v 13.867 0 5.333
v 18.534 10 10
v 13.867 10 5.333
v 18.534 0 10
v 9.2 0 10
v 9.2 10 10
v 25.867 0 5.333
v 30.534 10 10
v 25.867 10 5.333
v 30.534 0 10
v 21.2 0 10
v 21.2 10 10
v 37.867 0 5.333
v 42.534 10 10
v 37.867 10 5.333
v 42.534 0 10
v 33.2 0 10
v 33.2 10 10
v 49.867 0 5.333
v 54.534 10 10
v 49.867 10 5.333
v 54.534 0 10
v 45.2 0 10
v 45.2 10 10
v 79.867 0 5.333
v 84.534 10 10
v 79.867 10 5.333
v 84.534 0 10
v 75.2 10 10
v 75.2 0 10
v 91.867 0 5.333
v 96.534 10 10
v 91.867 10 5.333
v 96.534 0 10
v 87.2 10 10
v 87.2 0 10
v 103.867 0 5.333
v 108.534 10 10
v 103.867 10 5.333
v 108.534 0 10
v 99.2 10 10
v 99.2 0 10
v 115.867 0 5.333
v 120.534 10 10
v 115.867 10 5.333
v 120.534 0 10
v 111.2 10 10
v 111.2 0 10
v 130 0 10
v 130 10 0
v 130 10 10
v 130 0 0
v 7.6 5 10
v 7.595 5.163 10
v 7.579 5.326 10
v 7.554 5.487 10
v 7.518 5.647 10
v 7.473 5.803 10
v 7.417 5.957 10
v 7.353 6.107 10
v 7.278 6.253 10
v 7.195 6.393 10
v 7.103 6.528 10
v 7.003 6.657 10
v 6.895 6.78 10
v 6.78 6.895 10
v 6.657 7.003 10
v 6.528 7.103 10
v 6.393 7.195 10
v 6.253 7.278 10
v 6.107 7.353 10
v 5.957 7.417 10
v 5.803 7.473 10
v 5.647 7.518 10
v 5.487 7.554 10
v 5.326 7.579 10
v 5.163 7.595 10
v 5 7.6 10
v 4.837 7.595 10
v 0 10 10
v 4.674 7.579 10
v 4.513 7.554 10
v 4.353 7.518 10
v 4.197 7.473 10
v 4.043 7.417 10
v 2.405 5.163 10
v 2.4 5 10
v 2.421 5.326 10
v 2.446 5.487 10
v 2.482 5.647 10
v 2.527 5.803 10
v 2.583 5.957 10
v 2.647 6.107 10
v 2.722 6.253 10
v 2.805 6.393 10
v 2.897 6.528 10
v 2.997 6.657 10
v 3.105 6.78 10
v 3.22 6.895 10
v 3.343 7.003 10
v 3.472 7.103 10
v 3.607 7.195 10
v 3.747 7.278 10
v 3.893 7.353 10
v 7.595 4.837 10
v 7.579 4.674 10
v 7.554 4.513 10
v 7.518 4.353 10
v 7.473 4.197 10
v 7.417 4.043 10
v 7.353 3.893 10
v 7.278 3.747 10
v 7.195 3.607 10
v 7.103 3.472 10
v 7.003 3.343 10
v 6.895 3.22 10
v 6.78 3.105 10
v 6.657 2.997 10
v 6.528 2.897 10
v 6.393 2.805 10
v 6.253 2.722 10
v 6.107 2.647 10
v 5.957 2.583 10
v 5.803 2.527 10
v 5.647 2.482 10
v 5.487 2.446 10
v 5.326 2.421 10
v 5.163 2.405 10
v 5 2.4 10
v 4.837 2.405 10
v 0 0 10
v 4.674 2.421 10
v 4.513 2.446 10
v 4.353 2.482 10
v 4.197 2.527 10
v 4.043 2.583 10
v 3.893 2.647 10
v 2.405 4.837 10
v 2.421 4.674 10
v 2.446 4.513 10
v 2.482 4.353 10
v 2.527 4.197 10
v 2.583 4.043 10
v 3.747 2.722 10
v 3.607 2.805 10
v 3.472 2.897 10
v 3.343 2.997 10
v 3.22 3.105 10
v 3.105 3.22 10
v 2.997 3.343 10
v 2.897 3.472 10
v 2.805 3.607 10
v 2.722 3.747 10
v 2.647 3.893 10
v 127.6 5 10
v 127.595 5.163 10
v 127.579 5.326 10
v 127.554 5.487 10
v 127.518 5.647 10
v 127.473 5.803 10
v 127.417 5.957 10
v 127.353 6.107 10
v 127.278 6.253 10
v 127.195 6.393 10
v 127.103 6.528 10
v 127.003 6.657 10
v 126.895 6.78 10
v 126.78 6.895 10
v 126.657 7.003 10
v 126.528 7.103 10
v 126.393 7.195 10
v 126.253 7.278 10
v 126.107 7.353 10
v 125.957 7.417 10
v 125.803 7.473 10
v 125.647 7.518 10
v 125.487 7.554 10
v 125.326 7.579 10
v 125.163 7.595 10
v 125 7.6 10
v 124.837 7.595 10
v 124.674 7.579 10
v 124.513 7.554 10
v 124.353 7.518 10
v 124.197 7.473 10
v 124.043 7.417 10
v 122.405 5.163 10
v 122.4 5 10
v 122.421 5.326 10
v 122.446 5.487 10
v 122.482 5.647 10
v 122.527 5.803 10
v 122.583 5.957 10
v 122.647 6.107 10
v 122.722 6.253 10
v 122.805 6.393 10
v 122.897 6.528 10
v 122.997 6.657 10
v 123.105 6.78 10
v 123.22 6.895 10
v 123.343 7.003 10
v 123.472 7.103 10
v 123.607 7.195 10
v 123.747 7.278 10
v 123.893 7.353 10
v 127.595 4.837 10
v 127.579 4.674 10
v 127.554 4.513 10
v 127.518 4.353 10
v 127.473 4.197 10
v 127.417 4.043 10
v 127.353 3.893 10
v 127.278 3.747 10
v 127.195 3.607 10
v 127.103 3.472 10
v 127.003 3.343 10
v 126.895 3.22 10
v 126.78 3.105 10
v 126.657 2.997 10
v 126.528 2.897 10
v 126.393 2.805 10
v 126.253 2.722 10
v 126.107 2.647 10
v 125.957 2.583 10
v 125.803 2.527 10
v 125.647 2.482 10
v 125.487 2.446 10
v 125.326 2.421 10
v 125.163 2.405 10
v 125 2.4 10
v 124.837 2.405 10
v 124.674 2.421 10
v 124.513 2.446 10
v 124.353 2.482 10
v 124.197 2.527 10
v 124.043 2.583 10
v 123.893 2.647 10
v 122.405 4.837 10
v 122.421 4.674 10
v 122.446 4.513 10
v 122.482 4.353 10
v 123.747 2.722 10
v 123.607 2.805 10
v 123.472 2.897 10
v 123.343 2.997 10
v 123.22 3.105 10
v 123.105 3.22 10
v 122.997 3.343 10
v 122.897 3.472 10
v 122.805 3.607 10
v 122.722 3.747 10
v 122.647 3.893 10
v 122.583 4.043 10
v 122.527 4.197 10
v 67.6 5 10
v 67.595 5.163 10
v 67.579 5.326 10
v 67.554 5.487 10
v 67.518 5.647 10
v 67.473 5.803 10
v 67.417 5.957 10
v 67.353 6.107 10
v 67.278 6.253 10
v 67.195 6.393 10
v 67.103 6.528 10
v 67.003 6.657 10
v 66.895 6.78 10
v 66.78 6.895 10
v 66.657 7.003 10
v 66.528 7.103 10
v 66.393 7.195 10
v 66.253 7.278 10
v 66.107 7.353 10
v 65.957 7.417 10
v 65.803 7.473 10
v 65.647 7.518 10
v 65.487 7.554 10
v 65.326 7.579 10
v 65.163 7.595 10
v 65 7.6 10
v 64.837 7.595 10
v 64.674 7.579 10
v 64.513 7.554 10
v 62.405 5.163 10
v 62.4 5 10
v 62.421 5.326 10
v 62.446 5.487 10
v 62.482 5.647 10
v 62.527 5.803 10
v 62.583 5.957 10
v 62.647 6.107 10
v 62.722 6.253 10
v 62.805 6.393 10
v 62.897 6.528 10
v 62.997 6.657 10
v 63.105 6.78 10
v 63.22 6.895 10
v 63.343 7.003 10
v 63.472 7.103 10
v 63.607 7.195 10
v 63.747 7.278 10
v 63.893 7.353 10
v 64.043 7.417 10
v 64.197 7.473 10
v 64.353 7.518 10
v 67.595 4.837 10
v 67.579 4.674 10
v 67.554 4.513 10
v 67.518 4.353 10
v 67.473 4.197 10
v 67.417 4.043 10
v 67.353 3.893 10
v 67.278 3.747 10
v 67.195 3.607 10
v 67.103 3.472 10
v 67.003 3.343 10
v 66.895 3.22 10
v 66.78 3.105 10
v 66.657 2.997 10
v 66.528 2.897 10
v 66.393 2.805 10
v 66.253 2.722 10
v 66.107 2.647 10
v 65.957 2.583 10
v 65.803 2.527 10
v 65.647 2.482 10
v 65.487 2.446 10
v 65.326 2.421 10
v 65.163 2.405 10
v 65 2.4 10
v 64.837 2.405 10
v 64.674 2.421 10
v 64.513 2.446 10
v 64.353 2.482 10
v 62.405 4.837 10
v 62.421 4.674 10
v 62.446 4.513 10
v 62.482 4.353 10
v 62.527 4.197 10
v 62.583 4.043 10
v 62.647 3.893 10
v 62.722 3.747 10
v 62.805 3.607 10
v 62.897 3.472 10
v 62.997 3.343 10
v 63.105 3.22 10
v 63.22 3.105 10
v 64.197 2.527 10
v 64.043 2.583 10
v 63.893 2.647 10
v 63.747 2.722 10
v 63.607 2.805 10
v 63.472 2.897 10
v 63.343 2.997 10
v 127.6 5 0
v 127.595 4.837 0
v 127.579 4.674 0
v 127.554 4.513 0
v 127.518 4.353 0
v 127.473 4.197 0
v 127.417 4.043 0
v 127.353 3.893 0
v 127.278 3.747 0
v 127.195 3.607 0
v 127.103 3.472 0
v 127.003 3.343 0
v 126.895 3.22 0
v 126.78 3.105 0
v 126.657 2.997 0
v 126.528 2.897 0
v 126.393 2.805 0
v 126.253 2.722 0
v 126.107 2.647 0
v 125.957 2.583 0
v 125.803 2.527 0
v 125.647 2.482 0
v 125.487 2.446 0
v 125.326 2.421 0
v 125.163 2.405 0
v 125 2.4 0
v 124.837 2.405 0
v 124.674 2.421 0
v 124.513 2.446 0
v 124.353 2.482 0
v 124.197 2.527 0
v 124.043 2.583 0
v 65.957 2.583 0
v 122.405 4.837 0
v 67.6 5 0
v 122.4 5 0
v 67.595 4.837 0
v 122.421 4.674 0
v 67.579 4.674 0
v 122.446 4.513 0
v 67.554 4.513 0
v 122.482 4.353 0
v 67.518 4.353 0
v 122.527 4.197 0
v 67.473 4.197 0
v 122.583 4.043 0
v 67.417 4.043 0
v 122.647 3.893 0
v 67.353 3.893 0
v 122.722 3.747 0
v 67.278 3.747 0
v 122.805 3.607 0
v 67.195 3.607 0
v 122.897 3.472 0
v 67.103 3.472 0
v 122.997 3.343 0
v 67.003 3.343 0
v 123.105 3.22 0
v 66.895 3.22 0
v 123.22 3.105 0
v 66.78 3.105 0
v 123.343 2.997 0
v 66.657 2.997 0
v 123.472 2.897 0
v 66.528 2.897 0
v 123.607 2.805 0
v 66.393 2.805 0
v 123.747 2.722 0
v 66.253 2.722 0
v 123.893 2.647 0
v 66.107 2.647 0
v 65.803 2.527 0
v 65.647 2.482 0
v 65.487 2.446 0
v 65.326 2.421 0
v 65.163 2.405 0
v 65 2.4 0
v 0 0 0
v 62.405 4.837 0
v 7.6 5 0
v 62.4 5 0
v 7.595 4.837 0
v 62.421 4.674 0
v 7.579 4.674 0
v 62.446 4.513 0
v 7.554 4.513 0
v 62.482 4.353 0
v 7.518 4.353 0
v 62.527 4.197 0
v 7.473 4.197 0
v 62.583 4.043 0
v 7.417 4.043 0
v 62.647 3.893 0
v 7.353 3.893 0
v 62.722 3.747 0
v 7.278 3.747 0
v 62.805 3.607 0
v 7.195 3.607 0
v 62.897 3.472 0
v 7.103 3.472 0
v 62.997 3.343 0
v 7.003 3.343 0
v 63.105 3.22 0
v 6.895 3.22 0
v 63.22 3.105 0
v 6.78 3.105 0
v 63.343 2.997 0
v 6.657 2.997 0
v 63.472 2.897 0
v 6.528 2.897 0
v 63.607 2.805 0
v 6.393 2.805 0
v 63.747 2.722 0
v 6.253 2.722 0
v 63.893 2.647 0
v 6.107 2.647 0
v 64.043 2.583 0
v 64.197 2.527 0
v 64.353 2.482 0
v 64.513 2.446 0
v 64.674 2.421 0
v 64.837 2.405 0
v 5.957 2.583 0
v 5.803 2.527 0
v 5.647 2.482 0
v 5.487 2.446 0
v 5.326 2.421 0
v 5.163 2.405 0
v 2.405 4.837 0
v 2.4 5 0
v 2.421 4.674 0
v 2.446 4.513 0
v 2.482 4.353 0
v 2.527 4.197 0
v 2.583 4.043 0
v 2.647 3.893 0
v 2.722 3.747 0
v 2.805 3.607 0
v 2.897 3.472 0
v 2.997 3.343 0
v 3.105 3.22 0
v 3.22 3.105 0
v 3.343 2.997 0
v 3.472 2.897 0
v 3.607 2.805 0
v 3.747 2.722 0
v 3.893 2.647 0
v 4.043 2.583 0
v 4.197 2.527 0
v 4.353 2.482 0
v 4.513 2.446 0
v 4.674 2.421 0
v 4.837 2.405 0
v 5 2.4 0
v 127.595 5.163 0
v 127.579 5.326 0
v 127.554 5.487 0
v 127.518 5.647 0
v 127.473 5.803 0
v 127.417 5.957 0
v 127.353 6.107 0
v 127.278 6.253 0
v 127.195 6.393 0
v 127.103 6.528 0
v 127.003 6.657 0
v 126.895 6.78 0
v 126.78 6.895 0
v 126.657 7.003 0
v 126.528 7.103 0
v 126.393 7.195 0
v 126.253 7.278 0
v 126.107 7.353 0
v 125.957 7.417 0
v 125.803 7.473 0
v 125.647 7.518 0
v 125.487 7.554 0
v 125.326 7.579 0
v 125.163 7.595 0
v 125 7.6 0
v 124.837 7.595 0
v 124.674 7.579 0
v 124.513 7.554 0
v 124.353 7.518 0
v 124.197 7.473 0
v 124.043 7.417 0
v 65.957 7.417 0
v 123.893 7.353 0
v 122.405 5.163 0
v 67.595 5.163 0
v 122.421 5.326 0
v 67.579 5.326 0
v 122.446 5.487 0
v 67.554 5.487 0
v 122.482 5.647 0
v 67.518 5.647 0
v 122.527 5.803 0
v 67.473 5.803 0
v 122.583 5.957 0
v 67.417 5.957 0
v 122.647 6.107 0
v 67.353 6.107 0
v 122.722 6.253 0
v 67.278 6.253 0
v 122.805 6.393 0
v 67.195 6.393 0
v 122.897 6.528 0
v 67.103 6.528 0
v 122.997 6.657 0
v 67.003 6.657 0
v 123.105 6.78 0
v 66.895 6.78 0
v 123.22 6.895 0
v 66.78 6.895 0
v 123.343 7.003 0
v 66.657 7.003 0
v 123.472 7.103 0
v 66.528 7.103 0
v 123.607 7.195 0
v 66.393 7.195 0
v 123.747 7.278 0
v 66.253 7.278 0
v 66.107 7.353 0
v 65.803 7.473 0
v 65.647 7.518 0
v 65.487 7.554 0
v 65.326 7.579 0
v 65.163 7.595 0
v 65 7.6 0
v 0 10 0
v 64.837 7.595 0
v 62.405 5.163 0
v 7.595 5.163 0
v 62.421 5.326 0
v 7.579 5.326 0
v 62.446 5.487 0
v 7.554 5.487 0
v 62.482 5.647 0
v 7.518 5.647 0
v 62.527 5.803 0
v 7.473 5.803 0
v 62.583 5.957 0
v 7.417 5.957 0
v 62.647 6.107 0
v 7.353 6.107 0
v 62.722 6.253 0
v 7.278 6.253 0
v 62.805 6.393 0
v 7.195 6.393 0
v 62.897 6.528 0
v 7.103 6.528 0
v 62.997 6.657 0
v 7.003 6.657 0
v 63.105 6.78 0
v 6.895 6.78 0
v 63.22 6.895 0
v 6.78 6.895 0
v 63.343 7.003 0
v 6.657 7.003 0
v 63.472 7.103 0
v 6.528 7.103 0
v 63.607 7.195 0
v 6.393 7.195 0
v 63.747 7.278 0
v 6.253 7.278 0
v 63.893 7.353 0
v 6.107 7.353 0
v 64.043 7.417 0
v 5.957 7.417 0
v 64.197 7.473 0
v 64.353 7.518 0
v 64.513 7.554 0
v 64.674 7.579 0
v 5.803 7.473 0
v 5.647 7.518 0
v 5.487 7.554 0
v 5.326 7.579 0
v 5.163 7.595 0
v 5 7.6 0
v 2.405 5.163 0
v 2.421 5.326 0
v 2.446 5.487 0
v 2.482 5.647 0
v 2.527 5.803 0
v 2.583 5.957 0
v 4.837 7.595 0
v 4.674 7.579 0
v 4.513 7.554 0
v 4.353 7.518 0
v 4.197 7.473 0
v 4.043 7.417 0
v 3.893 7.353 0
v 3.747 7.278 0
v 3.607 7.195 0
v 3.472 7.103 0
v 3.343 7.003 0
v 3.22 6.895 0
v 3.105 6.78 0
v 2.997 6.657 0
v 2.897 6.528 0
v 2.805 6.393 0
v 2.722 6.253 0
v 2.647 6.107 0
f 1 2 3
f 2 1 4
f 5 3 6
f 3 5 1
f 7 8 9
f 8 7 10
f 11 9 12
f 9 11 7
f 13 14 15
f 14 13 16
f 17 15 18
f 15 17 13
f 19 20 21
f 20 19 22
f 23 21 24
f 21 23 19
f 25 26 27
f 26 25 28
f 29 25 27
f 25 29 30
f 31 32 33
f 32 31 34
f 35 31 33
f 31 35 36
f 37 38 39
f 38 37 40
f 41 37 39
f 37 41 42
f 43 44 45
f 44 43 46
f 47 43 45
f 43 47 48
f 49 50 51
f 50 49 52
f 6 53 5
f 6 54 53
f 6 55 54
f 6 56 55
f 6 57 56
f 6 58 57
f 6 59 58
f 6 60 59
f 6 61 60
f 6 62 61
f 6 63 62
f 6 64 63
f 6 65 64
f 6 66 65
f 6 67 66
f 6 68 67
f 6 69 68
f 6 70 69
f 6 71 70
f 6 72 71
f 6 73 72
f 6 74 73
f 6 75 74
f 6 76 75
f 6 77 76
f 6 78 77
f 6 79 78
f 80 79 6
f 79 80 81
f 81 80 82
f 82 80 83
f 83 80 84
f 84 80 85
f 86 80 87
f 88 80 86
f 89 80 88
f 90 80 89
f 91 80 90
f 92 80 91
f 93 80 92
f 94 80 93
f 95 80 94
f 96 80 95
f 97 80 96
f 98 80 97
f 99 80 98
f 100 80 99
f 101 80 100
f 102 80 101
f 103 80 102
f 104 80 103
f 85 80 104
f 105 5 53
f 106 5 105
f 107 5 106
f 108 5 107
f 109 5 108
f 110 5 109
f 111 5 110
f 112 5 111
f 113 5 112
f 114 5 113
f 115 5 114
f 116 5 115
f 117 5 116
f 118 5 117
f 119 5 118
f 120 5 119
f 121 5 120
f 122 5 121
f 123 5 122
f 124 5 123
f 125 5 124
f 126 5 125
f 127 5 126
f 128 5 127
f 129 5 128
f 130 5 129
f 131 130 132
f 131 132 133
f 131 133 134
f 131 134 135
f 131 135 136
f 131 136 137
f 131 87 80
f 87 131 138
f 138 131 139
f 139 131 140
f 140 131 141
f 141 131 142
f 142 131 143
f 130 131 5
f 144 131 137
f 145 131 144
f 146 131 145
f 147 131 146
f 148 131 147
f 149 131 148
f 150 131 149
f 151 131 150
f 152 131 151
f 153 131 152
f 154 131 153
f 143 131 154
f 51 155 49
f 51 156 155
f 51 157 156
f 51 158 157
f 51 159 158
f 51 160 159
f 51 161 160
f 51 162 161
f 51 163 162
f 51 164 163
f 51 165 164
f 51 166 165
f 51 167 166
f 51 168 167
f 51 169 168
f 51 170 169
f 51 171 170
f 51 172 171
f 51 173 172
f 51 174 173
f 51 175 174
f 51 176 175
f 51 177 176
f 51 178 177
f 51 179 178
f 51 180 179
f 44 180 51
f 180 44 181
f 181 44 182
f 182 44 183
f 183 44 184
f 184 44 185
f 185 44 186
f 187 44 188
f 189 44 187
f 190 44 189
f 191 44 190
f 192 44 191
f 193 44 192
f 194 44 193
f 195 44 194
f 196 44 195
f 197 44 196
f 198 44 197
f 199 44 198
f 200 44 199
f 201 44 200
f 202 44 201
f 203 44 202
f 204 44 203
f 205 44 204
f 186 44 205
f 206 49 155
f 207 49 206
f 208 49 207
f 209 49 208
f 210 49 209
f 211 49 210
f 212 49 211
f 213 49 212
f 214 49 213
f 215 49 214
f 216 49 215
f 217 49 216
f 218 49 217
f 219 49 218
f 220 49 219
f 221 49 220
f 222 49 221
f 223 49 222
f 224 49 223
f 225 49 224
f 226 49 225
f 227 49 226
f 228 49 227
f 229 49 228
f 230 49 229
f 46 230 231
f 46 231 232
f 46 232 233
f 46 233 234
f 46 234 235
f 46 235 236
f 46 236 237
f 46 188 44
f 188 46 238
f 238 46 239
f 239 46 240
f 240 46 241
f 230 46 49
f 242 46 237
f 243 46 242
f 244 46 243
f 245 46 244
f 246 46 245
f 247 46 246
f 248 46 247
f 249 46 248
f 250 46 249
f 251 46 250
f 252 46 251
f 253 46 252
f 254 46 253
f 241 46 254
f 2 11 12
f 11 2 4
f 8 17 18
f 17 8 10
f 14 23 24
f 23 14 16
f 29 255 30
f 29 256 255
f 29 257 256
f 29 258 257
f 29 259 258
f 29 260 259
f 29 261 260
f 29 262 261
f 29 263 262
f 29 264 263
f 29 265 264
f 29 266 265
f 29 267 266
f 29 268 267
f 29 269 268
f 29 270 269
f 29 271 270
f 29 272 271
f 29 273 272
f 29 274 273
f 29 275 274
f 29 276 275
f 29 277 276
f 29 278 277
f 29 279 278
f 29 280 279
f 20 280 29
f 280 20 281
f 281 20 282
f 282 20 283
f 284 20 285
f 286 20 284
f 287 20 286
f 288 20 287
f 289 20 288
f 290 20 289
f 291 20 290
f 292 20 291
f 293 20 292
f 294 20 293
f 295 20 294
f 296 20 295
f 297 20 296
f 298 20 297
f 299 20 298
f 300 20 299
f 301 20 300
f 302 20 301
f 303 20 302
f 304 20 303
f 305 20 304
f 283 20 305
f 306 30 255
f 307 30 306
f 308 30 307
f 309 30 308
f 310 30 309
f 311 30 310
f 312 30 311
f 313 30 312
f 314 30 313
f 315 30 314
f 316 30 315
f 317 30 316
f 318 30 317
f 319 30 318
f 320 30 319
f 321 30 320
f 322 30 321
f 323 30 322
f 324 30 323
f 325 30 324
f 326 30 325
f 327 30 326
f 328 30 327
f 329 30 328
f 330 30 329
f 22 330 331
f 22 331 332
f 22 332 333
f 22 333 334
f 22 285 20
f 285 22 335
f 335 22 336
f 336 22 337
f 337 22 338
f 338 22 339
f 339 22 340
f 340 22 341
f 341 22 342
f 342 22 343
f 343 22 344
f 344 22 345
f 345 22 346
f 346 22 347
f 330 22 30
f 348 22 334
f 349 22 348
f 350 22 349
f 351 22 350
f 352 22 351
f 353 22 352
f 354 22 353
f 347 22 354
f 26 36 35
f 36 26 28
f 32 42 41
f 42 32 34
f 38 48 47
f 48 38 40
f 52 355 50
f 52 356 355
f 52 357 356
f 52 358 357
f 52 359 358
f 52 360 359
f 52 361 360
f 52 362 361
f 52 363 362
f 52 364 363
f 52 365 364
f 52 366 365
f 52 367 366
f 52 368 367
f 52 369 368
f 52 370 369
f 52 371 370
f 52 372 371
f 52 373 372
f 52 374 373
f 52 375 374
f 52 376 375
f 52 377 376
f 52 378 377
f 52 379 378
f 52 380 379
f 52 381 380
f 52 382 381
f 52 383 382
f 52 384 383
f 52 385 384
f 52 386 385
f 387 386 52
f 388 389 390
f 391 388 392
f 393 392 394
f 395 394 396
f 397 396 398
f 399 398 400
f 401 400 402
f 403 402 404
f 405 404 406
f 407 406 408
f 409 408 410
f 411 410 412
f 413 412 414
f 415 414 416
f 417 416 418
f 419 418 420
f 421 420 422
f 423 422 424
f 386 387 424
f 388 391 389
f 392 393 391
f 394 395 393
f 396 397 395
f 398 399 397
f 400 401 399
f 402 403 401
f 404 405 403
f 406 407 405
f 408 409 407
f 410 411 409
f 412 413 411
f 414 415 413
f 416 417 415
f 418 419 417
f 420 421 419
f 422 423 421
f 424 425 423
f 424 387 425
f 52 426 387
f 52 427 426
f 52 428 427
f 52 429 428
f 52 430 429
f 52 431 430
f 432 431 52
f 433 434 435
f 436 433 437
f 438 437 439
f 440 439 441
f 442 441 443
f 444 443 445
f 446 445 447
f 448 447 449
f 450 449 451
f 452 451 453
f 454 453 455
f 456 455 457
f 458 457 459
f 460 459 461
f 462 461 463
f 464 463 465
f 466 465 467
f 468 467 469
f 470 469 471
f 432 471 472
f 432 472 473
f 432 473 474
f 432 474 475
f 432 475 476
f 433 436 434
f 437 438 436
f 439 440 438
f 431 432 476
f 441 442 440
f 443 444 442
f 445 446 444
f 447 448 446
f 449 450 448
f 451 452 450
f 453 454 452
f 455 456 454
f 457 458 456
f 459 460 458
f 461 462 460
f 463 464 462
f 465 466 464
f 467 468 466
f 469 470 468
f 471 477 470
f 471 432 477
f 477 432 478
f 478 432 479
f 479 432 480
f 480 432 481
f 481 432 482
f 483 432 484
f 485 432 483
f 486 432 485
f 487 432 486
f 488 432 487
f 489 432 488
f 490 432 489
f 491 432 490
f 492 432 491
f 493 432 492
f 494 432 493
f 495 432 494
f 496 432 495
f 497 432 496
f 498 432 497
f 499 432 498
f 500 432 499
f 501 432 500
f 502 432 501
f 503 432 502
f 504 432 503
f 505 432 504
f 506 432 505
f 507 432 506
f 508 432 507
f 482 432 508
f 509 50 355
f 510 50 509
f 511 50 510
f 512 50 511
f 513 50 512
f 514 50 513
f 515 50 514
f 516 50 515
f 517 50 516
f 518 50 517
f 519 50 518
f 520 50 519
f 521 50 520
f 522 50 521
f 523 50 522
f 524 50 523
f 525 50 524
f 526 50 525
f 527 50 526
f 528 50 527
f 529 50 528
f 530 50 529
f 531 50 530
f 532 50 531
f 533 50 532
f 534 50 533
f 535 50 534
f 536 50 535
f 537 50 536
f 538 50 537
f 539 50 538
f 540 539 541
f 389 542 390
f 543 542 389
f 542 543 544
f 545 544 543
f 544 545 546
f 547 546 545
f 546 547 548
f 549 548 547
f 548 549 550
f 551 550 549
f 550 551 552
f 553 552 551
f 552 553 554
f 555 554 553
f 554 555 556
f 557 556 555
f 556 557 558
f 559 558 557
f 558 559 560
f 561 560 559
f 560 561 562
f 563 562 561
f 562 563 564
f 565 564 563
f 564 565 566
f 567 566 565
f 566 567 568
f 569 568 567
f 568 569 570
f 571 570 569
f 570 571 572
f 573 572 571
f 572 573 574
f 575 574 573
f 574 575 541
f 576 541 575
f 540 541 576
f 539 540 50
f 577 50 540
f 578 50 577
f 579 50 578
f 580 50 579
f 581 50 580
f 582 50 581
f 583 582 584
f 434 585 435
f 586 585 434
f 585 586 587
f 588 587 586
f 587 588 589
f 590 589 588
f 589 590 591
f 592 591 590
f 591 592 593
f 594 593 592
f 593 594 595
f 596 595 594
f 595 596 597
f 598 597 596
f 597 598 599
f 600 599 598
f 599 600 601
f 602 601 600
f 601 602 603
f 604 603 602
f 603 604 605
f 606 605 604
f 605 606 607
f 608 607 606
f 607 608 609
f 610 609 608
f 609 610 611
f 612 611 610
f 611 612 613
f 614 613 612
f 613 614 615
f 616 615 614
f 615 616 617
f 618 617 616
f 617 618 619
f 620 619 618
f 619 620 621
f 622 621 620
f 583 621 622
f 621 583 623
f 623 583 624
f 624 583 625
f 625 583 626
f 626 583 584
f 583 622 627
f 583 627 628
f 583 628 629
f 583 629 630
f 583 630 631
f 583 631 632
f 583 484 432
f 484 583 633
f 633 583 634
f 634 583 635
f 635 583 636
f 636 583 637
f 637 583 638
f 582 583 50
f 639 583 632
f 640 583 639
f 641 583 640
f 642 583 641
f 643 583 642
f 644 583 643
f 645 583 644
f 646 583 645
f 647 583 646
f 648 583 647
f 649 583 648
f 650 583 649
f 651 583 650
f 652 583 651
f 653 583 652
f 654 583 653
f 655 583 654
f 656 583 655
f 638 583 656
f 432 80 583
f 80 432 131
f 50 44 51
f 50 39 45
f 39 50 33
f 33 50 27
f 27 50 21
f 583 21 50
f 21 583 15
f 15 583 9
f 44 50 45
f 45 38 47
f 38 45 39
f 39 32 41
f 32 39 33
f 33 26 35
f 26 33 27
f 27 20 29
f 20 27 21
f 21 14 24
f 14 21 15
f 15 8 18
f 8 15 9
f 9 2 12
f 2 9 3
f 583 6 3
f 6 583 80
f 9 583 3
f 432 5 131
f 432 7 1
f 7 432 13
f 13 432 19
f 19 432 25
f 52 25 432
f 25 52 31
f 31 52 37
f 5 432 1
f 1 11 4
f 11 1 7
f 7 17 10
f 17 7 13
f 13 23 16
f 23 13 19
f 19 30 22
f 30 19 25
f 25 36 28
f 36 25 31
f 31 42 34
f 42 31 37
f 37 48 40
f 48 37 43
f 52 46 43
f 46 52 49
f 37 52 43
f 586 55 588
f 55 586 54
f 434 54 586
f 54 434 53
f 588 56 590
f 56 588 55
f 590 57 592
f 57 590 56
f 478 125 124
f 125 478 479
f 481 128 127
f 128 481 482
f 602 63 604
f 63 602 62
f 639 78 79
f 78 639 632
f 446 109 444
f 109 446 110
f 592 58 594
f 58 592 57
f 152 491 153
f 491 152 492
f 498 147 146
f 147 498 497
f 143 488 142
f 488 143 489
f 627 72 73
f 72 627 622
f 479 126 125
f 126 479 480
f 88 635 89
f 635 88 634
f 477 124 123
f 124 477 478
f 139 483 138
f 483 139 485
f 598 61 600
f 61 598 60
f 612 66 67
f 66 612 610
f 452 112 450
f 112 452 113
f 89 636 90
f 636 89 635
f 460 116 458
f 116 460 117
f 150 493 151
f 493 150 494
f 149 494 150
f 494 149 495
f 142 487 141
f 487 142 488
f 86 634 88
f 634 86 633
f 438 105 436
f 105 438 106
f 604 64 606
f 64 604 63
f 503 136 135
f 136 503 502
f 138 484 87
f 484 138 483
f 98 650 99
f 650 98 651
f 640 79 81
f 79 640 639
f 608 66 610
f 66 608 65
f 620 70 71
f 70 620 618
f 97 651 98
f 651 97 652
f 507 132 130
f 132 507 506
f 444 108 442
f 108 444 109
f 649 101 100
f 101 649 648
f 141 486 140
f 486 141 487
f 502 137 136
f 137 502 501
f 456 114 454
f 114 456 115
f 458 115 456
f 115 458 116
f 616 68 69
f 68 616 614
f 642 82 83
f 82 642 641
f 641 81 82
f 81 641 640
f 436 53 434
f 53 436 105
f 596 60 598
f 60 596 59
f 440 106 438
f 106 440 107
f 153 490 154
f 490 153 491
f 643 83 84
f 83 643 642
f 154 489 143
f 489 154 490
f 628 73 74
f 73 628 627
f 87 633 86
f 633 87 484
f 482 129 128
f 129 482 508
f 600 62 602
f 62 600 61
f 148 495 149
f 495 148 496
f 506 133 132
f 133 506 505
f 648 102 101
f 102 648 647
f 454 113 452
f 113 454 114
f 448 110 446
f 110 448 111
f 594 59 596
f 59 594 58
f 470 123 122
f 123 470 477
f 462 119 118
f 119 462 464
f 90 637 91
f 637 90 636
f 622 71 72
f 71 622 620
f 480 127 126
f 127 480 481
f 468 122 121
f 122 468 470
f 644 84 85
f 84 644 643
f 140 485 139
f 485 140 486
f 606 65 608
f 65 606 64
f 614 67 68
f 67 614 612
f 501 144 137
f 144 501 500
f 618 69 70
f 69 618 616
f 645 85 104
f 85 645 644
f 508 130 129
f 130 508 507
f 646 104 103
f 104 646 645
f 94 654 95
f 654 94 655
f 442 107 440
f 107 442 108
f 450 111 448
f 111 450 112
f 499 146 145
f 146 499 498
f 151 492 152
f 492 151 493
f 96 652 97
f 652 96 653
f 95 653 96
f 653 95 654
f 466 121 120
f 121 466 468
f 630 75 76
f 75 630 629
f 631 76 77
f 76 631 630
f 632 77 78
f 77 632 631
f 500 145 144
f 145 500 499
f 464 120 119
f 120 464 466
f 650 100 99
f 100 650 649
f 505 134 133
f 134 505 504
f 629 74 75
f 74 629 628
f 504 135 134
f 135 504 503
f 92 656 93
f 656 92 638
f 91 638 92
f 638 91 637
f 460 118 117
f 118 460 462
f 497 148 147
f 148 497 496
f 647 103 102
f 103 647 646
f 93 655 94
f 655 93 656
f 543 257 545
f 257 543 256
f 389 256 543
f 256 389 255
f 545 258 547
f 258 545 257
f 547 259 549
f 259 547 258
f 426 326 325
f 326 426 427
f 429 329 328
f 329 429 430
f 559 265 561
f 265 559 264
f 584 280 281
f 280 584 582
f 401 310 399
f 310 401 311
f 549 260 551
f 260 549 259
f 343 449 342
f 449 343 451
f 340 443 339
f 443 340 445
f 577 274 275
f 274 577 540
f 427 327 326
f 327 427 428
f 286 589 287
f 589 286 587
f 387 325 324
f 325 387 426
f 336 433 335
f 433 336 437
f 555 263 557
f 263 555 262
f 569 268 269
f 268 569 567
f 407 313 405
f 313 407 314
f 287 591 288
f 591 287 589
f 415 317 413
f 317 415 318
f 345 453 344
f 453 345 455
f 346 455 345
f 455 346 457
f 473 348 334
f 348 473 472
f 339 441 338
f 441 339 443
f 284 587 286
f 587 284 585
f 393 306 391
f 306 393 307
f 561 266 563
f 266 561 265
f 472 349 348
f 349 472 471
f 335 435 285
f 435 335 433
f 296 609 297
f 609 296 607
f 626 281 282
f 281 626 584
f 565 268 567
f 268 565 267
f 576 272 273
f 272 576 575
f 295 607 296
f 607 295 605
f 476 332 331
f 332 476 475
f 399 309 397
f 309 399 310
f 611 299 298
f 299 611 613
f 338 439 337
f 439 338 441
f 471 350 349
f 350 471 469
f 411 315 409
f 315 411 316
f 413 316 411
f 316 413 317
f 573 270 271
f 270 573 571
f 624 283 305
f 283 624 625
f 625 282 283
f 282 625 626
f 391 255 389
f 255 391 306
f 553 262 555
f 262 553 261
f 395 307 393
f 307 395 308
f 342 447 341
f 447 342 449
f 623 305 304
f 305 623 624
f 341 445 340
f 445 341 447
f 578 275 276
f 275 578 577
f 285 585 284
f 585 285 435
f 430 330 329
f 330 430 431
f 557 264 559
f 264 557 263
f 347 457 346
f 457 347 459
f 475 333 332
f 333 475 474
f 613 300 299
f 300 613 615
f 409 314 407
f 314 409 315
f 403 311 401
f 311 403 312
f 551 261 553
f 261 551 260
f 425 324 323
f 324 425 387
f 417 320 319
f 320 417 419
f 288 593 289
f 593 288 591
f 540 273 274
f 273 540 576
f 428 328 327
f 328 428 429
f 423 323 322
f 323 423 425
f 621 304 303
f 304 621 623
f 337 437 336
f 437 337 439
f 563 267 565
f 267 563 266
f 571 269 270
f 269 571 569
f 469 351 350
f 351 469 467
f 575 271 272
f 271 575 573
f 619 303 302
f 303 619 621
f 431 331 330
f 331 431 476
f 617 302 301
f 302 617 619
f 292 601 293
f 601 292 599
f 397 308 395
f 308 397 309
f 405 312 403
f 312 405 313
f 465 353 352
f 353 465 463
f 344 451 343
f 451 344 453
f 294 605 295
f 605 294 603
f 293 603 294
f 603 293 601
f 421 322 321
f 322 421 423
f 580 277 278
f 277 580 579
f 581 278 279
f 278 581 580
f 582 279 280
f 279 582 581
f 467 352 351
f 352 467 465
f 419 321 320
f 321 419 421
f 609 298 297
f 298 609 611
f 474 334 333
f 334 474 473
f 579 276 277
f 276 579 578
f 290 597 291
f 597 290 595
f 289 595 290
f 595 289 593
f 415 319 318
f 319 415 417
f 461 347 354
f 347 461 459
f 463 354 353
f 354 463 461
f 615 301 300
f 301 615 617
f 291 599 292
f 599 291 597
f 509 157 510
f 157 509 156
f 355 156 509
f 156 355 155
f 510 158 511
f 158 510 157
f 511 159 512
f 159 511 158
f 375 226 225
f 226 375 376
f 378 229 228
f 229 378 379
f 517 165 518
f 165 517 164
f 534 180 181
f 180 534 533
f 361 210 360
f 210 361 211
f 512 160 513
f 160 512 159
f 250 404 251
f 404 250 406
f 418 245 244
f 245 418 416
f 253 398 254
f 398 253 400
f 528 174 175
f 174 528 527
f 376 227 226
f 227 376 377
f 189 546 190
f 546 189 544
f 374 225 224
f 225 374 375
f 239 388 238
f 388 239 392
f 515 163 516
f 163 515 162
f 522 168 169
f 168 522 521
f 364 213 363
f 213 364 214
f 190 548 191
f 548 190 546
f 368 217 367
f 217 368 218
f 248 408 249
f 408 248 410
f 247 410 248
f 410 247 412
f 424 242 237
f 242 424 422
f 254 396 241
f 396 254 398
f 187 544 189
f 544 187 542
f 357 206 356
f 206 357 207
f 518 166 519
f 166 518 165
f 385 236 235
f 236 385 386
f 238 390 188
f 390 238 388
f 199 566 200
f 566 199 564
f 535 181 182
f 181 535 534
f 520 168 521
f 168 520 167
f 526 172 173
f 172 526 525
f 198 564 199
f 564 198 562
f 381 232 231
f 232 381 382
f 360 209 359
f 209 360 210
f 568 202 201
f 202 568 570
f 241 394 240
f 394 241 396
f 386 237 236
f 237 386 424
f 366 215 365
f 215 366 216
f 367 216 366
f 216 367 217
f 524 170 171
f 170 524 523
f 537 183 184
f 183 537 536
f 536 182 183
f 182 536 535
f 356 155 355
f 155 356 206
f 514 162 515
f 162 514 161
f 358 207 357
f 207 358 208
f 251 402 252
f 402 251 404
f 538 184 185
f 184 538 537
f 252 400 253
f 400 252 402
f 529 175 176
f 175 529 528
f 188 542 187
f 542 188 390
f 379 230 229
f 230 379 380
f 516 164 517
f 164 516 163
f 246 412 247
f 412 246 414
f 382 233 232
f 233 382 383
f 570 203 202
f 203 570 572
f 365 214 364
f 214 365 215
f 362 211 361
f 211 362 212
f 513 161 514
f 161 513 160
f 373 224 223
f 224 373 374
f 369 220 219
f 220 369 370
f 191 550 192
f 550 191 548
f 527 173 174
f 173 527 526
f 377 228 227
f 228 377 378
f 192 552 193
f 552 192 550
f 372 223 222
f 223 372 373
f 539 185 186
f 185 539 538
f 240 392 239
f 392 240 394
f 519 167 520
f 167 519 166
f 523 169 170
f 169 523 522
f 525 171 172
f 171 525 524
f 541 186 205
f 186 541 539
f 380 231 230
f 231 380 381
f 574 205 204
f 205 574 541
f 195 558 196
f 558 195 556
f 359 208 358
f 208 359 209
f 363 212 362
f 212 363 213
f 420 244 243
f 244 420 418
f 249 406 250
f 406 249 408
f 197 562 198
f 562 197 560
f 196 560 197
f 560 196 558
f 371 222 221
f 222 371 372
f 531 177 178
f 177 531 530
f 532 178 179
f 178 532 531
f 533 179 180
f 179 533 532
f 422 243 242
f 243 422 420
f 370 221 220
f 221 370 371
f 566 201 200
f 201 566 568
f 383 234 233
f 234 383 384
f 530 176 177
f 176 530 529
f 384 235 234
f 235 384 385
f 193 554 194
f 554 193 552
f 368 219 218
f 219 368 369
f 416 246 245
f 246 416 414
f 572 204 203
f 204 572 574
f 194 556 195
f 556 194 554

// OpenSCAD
// file: functions.scad
/**********************************
	File: functions.scad
	Revision: 0.1 (10/7/2012)
	OpenSCAD version by:
	Michael Williams (gannon)
	mswillia@mtu.edu
**********************************/
include <config.scad>

//Drill a hole the given depth at the given location
module drill(x,y,radius,depth) {
	translate([x,y,-overdrill])
		cylinder(r=radius,h=depth,$fn=100);
}

module roundedcorner(radius,thickness,angle) {
	rotate([0,0,angle])
		translate([-radius+overdrill,-radius+overdrill,-overdrill])
			difference() {
				translate([-overdrill,-overdrill,0])
					cube([radius+overdrill,radius+overdrill,thickness+overdrill*2]);
				cylinder(r=radius,h=thickness+overdrill*2);
			}
}

//Usage: points is an array consisting of elements
//[x,y,r] for each point of the polygon
//Please note that x and y will be the centers
//of the rounded edges! Outside wall will be
//r away at some angle.
//Ideally I will make a function that will find
//the place to put the circle of a given radius
//based off of the points in the polygon.
module multiradiusroundedpoly(points,height) {
	linear_extrude(height=height)
		hull()
			for (p = points) {
				translate([p[0],p[1],0])
					circle(r=p[2],$fn=100);
			}
}
// file: config.scad
/**********************************
	File: config.scad
	Revision: 0.1 (10/7/2012)
	OpenSCAD version by:
	Michael Williams (gannon)
	mswillia@mtu.edu
**********************************/

/**********************************
		CONFIGURATION
**********************************/
//This is for the depth of holes so OpenSCAD renders correctly.
overdrill=0.1;

//Eventually group configurations into here. Maybe auto config for metric vs SAE components?

/**********************************
		END CONFIGURATION
**********************************/
// main file
/**********************************
	File: ElectronicsEnclosureSides.scad
	Revision: 0.3 (1/5/2013)
	OpenSCAD version by:
	Michael Williams (gannon)
	mswillia@mtu.edu
**********************************/
include <config.scad>
use <functions.scad>
/**********************************
		CONFIGURATION
**********************************/
//Base size
width=130;
height=10;
thickness=10;

//Holes
radius=2.6;

/**********************************
		END CONFIGURATION
**********************************/

difference() {
	//Make our base unit
	cube([width,height,thickness]);

	//Drill the hole
	drill(5,height/2,radius,thickness+overdrill*2);
	drill(width/2,height/2,radius,thickness+overdrill*2);
	drill(width-5,height/2,radius,thickness+overdrill*2);

	//Make the strain reliefs
	translate([9.2,-overdrill,0])
		strain_relief();
	translate([75.2,-overdrill,0])
		strain_relief();
}

module strain_relief() {
	union() {
		translate([0,0,thickness])
			rotate([0,45,0])
				cube([6.6,height+overdrill*2,6.6]);
		translate([12,0,thickness])
			rotate([0,45,0])
				cube([6.6,height+overdrill*2,6.6]);
		translate([24,0,thickness])
			rotate([0,45,0])
				cube([6.6,height+overdrill*2,6.6]);
		translate([36,0,thickness])
			rotate([0,45,0])
				cube([6.6,height+overdrill*2,6.6]);
	}
}
